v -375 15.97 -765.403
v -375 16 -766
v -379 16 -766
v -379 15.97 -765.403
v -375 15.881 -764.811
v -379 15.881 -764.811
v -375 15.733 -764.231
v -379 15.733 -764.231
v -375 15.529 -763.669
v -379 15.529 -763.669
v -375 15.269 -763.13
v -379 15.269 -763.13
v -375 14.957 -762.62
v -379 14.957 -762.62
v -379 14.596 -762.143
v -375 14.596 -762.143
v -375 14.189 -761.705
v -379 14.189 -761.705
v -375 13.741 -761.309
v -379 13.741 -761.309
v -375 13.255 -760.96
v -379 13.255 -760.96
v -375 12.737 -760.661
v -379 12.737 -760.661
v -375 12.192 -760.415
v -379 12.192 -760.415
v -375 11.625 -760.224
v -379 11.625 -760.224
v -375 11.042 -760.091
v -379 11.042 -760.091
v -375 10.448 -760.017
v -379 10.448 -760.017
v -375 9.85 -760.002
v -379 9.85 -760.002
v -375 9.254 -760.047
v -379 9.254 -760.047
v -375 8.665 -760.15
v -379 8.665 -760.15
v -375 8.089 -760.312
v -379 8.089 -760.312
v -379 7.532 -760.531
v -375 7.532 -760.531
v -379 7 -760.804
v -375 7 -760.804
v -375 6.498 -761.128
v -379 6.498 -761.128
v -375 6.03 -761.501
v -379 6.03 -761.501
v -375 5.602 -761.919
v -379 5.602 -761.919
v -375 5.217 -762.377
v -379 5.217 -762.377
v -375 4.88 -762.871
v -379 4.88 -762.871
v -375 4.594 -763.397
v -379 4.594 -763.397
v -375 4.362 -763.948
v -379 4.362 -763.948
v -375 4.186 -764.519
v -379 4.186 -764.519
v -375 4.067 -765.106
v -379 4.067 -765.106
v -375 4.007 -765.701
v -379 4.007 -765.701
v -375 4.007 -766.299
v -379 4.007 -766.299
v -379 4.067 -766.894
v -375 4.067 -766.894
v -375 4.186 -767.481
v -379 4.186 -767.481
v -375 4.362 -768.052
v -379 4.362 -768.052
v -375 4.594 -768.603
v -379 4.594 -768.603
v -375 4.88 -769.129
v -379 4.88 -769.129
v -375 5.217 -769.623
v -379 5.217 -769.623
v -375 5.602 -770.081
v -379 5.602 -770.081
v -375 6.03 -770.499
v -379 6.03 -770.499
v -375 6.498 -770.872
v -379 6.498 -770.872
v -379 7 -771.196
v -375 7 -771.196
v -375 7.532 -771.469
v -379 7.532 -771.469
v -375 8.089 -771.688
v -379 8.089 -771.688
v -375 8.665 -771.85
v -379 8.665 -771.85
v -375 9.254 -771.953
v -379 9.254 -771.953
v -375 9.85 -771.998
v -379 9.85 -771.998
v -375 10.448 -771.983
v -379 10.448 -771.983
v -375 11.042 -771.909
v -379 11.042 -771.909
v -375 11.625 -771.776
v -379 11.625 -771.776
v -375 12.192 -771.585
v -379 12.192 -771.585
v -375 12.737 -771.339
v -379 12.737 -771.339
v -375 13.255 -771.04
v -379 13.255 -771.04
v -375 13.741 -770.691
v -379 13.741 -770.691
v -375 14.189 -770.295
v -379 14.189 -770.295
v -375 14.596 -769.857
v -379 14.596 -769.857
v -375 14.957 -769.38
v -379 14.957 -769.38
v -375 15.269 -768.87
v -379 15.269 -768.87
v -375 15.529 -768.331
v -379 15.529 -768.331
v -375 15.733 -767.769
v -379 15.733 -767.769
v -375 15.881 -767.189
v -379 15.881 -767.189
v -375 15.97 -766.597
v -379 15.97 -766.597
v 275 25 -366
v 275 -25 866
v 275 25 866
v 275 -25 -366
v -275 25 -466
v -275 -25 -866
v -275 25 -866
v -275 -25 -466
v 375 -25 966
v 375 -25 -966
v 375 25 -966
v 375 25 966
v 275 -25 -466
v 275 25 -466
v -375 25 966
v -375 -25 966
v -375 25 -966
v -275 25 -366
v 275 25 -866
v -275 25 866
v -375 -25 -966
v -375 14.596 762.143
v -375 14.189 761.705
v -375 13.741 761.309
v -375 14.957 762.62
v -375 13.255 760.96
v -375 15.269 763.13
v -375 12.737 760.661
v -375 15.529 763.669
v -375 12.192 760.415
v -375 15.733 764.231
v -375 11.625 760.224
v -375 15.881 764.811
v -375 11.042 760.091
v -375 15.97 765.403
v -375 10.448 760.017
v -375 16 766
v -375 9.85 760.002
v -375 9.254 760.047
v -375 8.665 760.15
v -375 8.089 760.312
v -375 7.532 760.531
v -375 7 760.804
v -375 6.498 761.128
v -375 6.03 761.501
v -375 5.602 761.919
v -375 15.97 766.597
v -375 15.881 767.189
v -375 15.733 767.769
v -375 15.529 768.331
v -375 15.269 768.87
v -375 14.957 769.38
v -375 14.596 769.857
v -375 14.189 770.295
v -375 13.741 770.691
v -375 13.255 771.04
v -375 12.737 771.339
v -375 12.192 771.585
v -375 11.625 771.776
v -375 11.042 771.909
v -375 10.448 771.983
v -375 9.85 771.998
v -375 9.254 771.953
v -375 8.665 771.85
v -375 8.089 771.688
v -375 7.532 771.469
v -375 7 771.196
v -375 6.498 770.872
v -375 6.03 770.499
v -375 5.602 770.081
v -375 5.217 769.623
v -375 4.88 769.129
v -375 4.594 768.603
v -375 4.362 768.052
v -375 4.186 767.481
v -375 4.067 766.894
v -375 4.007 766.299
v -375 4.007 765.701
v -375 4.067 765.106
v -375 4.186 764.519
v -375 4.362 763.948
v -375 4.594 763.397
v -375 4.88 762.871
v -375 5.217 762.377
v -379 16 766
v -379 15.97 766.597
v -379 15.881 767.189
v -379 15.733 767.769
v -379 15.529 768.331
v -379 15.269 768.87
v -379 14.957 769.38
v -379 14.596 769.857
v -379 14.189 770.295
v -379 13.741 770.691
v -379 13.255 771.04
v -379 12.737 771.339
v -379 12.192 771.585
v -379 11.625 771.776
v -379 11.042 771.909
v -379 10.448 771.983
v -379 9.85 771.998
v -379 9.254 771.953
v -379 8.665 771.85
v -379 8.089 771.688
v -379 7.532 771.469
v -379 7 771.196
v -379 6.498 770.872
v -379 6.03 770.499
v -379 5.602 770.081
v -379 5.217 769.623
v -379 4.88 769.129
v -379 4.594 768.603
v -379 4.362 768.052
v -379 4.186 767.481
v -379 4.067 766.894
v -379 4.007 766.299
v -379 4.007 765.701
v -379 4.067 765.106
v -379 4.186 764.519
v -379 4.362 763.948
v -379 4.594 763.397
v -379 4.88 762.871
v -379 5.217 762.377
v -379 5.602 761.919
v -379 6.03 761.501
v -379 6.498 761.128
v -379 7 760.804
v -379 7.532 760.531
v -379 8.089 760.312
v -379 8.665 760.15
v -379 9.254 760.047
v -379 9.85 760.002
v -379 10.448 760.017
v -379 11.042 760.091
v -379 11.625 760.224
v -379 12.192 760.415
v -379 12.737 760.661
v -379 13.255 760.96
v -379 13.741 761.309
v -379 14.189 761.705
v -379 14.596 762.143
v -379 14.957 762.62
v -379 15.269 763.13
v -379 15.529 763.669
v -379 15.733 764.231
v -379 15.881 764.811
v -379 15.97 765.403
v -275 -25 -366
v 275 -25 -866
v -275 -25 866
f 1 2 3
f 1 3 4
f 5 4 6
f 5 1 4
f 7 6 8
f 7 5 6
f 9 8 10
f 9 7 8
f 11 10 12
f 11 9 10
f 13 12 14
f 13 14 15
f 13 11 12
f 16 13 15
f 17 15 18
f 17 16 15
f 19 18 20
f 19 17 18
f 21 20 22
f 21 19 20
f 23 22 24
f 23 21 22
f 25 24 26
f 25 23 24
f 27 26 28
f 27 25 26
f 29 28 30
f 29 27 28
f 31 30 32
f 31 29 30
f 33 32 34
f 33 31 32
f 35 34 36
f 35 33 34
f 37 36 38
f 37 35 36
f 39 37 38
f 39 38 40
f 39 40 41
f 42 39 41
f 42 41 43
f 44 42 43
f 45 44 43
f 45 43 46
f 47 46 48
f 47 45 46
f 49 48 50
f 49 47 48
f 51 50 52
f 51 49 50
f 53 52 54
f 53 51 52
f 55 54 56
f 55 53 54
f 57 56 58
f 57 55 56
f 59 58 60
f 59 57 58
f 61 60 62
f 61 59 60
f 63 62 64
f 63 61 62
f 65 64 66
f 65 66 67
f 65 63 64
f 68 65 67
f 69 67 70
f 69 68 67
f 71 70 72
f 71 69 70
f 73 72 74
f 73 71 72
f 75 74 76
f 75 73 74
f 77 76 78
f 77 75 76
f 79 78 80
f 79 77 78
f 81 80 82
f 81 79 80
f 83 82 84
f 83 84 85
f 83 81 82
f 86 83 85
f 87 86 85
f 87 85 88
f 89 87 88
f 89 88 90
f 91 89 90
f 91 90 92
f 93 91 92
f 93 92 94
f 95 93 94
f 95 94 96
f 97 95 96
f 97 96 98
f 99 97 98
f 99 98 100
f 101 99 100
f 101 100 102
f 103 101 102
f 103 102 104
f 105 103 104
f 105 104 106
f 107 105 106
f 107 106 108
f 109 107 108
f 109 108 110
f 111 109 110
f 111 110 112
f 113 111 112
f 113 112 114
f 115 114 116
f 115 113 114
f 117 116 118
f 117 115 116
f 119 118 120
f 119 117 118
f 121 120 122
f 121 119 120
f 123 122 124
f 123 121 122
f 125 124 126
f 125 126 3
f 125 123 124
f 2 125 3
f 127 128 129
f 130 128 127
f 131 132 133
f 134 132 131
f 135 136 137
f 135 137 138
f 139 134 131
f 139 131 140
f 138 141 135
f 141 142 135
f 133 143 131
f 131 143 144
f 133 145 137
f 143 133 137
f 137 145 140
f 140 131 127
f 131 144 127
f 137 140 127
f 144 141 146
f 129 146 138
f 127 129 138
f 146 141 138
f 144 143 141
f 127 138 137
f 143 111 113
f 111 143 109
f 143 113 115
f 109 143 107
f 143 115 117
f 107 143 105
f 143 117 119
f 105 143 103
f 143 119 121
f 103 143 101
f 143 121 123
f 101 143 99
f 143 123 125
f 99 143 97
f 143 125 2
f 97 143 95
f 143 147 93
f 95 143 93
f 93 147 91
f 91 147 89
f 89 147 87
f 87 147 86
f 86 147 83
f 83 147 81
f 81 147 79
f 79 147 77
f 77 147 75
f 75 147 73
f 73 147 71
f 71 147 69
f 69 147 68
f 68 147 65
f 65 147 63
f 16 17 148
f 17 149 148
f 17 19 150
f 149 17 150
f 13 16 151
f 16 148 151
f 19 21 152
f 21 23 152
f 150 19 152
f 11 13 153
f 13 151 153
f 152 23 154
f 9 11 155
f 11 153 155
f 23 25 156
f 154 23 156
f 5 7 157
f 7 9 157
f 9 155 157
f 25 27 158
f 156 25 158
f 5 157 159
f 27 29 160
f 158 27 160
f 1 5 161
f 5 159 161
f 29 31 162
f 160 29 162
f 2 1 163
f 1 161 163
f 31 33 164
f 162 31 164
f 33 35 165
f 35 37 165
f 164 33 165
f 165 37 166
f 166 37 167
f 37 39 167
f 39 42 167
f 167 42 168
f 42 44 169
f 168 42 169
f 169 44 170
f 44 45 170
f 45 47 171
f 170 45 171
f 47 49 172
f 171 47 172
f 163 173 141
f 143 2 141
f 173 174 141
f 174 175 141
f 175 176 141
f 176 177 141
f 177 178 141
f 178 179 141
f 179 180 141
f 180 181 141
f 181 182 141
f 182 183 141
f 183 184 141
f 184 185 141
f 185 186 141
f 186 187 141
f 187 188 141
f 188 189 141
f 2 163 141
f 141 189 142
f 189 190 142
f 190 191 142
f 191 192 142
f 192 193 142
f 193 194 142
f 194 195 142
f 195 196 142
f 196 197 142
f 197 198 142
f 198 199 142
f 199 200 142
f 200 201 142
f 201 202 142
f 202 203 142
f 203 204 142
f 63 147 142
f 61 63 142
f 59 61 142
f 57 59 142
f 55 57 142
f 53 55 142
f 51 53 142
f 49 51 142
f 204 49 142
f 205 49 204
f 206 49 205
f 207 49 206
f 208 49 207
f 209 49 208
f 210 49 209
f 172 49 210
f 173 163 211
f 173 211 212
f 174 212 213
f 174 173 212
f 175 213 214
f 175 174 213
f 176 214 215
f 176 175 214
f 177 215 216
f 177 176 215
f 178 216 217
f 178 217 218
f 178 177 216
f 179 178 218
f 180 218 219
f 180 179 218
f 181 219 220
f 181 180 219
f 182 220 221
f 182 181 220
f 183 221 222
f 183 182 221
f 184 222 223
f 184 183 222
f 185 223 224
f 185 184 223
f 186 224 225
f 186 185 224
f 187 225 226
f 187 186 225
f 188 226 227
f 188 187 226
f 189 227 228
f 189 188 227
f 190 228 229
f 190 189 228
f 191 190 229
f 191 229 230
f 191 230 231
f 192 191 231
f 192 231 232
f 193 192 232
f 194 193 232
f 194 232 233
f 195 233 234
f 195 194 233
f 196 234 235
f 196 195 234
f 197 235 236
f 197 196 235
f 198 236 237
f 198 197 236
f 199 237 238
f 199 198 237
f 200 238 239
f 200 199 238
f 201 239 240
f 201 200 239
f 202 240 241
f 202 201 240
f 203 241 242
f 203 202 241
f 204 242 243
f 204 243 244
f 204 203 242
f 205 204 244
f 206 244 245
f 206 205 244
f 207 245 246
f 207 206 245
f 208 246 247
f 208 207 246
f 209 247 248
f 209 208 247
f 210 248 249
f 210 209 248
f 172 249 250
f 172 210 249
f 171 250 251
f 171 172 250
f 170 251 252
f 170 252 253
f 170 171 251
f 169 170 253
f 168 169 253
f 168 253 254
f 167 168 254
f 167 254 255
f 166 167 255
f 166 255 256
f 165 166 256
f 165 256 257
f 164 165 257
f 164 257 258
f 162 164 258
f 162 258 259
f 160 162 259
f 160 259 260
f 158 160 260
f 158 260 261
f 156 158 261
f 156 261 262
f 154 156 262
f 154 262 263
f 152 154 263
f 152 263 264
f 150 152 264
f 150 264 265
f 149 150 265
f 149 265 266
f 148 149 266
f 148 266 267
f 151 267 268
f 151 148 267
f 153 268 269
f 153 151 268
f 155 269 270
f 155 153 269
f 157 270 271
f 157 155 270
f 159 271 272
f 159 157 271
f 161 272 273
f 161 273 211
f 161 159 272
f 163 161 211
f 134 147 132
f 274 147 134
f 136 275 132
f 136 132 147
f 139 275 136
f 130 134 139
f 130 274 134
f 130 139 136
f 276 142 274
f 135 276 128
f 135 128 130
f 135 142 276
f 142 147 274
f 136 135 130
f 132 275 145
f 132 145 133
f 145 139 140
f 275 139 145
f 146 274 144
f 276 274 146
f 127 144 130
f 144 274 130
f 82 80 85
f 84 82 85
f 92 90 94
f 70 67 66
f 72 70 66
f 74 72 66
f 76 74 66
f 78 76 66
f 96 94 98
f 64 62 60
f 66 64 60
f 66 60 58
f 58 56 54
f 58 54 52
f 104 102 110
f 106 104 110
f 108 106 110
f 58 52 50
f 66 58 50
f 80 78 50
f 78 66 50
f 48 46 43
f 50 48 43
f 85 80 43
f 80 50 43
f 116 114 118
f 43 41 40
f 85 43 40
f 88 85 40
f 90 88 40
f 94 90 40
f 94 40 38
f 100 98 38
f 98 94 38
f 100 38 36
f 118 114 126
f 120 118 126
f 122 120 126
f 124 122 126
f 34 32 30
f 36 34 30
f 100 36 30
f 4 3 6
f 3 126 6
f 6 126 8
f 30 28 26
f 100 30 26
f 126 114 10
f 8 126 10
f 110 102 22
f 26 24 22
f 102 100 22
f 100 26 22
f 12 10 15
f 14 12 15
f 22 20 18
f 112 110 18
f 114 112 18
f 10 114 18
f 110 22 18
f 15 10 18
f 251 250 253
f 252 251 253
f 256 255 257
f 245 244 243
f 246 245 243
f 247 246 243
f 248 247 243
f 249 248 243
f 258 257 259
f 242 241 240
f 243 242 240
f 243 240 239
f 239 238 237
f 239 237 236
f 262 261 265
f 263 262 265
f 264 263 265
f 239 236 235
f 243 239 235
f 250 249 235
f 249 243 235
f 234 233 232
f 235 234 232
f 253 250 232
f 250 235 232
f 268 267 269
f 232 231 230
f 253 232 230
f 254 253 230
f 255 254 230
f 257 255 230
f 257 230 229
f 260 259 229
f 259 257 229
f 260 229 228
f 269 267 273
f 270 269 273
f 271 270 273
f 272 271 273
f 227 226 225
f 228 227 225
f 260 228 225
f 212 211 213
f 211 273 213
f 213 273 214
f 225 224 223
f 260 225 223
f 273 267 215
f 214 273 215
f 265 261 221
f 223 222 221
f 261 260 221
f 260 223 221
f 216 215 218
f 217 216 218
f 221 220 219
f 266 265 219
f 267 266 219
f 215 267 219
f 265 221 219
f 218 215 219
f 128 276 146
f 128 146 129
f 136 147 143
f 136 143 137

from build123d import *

# Parameters (mm, degrees)
F0_W     = 750
F0_H     = 1932
F0_W_2   = 550
F0_H_2   = 100
F1_DEPTH = 25
F3_R     = 6
F4_DEPTH = 4


with BuildPart() as f1:
    # F0 (on Front) → F1 (new body, symmetric)
    with BuildSketch(Plane.XZ):
        Rectangle(F0_W, F0_H)
        Polygon((-275, -366), (-275, 866), (275, 866), (275, -366), (275, -466), (275, -866), (-275, -866), (-275, -466), align=None, mode=Mode.SUBTRACT)
        with Locations((0, -416)):
            Rectangle(F0_W_2, F0_H_2)
    extrude(amount=F1_DEPTH, both=True)

    # F3 (on offset) → F4 (join)
    with BuildSketch(Plane.YZ.offset(-375)):
        with Locations((10, 766)):
            Circle(F3_R)
        with Locations((10, -766)):
            Circle(F3_R)
    extrude(amount=-F4_DEPTH)


solid = f1.part
